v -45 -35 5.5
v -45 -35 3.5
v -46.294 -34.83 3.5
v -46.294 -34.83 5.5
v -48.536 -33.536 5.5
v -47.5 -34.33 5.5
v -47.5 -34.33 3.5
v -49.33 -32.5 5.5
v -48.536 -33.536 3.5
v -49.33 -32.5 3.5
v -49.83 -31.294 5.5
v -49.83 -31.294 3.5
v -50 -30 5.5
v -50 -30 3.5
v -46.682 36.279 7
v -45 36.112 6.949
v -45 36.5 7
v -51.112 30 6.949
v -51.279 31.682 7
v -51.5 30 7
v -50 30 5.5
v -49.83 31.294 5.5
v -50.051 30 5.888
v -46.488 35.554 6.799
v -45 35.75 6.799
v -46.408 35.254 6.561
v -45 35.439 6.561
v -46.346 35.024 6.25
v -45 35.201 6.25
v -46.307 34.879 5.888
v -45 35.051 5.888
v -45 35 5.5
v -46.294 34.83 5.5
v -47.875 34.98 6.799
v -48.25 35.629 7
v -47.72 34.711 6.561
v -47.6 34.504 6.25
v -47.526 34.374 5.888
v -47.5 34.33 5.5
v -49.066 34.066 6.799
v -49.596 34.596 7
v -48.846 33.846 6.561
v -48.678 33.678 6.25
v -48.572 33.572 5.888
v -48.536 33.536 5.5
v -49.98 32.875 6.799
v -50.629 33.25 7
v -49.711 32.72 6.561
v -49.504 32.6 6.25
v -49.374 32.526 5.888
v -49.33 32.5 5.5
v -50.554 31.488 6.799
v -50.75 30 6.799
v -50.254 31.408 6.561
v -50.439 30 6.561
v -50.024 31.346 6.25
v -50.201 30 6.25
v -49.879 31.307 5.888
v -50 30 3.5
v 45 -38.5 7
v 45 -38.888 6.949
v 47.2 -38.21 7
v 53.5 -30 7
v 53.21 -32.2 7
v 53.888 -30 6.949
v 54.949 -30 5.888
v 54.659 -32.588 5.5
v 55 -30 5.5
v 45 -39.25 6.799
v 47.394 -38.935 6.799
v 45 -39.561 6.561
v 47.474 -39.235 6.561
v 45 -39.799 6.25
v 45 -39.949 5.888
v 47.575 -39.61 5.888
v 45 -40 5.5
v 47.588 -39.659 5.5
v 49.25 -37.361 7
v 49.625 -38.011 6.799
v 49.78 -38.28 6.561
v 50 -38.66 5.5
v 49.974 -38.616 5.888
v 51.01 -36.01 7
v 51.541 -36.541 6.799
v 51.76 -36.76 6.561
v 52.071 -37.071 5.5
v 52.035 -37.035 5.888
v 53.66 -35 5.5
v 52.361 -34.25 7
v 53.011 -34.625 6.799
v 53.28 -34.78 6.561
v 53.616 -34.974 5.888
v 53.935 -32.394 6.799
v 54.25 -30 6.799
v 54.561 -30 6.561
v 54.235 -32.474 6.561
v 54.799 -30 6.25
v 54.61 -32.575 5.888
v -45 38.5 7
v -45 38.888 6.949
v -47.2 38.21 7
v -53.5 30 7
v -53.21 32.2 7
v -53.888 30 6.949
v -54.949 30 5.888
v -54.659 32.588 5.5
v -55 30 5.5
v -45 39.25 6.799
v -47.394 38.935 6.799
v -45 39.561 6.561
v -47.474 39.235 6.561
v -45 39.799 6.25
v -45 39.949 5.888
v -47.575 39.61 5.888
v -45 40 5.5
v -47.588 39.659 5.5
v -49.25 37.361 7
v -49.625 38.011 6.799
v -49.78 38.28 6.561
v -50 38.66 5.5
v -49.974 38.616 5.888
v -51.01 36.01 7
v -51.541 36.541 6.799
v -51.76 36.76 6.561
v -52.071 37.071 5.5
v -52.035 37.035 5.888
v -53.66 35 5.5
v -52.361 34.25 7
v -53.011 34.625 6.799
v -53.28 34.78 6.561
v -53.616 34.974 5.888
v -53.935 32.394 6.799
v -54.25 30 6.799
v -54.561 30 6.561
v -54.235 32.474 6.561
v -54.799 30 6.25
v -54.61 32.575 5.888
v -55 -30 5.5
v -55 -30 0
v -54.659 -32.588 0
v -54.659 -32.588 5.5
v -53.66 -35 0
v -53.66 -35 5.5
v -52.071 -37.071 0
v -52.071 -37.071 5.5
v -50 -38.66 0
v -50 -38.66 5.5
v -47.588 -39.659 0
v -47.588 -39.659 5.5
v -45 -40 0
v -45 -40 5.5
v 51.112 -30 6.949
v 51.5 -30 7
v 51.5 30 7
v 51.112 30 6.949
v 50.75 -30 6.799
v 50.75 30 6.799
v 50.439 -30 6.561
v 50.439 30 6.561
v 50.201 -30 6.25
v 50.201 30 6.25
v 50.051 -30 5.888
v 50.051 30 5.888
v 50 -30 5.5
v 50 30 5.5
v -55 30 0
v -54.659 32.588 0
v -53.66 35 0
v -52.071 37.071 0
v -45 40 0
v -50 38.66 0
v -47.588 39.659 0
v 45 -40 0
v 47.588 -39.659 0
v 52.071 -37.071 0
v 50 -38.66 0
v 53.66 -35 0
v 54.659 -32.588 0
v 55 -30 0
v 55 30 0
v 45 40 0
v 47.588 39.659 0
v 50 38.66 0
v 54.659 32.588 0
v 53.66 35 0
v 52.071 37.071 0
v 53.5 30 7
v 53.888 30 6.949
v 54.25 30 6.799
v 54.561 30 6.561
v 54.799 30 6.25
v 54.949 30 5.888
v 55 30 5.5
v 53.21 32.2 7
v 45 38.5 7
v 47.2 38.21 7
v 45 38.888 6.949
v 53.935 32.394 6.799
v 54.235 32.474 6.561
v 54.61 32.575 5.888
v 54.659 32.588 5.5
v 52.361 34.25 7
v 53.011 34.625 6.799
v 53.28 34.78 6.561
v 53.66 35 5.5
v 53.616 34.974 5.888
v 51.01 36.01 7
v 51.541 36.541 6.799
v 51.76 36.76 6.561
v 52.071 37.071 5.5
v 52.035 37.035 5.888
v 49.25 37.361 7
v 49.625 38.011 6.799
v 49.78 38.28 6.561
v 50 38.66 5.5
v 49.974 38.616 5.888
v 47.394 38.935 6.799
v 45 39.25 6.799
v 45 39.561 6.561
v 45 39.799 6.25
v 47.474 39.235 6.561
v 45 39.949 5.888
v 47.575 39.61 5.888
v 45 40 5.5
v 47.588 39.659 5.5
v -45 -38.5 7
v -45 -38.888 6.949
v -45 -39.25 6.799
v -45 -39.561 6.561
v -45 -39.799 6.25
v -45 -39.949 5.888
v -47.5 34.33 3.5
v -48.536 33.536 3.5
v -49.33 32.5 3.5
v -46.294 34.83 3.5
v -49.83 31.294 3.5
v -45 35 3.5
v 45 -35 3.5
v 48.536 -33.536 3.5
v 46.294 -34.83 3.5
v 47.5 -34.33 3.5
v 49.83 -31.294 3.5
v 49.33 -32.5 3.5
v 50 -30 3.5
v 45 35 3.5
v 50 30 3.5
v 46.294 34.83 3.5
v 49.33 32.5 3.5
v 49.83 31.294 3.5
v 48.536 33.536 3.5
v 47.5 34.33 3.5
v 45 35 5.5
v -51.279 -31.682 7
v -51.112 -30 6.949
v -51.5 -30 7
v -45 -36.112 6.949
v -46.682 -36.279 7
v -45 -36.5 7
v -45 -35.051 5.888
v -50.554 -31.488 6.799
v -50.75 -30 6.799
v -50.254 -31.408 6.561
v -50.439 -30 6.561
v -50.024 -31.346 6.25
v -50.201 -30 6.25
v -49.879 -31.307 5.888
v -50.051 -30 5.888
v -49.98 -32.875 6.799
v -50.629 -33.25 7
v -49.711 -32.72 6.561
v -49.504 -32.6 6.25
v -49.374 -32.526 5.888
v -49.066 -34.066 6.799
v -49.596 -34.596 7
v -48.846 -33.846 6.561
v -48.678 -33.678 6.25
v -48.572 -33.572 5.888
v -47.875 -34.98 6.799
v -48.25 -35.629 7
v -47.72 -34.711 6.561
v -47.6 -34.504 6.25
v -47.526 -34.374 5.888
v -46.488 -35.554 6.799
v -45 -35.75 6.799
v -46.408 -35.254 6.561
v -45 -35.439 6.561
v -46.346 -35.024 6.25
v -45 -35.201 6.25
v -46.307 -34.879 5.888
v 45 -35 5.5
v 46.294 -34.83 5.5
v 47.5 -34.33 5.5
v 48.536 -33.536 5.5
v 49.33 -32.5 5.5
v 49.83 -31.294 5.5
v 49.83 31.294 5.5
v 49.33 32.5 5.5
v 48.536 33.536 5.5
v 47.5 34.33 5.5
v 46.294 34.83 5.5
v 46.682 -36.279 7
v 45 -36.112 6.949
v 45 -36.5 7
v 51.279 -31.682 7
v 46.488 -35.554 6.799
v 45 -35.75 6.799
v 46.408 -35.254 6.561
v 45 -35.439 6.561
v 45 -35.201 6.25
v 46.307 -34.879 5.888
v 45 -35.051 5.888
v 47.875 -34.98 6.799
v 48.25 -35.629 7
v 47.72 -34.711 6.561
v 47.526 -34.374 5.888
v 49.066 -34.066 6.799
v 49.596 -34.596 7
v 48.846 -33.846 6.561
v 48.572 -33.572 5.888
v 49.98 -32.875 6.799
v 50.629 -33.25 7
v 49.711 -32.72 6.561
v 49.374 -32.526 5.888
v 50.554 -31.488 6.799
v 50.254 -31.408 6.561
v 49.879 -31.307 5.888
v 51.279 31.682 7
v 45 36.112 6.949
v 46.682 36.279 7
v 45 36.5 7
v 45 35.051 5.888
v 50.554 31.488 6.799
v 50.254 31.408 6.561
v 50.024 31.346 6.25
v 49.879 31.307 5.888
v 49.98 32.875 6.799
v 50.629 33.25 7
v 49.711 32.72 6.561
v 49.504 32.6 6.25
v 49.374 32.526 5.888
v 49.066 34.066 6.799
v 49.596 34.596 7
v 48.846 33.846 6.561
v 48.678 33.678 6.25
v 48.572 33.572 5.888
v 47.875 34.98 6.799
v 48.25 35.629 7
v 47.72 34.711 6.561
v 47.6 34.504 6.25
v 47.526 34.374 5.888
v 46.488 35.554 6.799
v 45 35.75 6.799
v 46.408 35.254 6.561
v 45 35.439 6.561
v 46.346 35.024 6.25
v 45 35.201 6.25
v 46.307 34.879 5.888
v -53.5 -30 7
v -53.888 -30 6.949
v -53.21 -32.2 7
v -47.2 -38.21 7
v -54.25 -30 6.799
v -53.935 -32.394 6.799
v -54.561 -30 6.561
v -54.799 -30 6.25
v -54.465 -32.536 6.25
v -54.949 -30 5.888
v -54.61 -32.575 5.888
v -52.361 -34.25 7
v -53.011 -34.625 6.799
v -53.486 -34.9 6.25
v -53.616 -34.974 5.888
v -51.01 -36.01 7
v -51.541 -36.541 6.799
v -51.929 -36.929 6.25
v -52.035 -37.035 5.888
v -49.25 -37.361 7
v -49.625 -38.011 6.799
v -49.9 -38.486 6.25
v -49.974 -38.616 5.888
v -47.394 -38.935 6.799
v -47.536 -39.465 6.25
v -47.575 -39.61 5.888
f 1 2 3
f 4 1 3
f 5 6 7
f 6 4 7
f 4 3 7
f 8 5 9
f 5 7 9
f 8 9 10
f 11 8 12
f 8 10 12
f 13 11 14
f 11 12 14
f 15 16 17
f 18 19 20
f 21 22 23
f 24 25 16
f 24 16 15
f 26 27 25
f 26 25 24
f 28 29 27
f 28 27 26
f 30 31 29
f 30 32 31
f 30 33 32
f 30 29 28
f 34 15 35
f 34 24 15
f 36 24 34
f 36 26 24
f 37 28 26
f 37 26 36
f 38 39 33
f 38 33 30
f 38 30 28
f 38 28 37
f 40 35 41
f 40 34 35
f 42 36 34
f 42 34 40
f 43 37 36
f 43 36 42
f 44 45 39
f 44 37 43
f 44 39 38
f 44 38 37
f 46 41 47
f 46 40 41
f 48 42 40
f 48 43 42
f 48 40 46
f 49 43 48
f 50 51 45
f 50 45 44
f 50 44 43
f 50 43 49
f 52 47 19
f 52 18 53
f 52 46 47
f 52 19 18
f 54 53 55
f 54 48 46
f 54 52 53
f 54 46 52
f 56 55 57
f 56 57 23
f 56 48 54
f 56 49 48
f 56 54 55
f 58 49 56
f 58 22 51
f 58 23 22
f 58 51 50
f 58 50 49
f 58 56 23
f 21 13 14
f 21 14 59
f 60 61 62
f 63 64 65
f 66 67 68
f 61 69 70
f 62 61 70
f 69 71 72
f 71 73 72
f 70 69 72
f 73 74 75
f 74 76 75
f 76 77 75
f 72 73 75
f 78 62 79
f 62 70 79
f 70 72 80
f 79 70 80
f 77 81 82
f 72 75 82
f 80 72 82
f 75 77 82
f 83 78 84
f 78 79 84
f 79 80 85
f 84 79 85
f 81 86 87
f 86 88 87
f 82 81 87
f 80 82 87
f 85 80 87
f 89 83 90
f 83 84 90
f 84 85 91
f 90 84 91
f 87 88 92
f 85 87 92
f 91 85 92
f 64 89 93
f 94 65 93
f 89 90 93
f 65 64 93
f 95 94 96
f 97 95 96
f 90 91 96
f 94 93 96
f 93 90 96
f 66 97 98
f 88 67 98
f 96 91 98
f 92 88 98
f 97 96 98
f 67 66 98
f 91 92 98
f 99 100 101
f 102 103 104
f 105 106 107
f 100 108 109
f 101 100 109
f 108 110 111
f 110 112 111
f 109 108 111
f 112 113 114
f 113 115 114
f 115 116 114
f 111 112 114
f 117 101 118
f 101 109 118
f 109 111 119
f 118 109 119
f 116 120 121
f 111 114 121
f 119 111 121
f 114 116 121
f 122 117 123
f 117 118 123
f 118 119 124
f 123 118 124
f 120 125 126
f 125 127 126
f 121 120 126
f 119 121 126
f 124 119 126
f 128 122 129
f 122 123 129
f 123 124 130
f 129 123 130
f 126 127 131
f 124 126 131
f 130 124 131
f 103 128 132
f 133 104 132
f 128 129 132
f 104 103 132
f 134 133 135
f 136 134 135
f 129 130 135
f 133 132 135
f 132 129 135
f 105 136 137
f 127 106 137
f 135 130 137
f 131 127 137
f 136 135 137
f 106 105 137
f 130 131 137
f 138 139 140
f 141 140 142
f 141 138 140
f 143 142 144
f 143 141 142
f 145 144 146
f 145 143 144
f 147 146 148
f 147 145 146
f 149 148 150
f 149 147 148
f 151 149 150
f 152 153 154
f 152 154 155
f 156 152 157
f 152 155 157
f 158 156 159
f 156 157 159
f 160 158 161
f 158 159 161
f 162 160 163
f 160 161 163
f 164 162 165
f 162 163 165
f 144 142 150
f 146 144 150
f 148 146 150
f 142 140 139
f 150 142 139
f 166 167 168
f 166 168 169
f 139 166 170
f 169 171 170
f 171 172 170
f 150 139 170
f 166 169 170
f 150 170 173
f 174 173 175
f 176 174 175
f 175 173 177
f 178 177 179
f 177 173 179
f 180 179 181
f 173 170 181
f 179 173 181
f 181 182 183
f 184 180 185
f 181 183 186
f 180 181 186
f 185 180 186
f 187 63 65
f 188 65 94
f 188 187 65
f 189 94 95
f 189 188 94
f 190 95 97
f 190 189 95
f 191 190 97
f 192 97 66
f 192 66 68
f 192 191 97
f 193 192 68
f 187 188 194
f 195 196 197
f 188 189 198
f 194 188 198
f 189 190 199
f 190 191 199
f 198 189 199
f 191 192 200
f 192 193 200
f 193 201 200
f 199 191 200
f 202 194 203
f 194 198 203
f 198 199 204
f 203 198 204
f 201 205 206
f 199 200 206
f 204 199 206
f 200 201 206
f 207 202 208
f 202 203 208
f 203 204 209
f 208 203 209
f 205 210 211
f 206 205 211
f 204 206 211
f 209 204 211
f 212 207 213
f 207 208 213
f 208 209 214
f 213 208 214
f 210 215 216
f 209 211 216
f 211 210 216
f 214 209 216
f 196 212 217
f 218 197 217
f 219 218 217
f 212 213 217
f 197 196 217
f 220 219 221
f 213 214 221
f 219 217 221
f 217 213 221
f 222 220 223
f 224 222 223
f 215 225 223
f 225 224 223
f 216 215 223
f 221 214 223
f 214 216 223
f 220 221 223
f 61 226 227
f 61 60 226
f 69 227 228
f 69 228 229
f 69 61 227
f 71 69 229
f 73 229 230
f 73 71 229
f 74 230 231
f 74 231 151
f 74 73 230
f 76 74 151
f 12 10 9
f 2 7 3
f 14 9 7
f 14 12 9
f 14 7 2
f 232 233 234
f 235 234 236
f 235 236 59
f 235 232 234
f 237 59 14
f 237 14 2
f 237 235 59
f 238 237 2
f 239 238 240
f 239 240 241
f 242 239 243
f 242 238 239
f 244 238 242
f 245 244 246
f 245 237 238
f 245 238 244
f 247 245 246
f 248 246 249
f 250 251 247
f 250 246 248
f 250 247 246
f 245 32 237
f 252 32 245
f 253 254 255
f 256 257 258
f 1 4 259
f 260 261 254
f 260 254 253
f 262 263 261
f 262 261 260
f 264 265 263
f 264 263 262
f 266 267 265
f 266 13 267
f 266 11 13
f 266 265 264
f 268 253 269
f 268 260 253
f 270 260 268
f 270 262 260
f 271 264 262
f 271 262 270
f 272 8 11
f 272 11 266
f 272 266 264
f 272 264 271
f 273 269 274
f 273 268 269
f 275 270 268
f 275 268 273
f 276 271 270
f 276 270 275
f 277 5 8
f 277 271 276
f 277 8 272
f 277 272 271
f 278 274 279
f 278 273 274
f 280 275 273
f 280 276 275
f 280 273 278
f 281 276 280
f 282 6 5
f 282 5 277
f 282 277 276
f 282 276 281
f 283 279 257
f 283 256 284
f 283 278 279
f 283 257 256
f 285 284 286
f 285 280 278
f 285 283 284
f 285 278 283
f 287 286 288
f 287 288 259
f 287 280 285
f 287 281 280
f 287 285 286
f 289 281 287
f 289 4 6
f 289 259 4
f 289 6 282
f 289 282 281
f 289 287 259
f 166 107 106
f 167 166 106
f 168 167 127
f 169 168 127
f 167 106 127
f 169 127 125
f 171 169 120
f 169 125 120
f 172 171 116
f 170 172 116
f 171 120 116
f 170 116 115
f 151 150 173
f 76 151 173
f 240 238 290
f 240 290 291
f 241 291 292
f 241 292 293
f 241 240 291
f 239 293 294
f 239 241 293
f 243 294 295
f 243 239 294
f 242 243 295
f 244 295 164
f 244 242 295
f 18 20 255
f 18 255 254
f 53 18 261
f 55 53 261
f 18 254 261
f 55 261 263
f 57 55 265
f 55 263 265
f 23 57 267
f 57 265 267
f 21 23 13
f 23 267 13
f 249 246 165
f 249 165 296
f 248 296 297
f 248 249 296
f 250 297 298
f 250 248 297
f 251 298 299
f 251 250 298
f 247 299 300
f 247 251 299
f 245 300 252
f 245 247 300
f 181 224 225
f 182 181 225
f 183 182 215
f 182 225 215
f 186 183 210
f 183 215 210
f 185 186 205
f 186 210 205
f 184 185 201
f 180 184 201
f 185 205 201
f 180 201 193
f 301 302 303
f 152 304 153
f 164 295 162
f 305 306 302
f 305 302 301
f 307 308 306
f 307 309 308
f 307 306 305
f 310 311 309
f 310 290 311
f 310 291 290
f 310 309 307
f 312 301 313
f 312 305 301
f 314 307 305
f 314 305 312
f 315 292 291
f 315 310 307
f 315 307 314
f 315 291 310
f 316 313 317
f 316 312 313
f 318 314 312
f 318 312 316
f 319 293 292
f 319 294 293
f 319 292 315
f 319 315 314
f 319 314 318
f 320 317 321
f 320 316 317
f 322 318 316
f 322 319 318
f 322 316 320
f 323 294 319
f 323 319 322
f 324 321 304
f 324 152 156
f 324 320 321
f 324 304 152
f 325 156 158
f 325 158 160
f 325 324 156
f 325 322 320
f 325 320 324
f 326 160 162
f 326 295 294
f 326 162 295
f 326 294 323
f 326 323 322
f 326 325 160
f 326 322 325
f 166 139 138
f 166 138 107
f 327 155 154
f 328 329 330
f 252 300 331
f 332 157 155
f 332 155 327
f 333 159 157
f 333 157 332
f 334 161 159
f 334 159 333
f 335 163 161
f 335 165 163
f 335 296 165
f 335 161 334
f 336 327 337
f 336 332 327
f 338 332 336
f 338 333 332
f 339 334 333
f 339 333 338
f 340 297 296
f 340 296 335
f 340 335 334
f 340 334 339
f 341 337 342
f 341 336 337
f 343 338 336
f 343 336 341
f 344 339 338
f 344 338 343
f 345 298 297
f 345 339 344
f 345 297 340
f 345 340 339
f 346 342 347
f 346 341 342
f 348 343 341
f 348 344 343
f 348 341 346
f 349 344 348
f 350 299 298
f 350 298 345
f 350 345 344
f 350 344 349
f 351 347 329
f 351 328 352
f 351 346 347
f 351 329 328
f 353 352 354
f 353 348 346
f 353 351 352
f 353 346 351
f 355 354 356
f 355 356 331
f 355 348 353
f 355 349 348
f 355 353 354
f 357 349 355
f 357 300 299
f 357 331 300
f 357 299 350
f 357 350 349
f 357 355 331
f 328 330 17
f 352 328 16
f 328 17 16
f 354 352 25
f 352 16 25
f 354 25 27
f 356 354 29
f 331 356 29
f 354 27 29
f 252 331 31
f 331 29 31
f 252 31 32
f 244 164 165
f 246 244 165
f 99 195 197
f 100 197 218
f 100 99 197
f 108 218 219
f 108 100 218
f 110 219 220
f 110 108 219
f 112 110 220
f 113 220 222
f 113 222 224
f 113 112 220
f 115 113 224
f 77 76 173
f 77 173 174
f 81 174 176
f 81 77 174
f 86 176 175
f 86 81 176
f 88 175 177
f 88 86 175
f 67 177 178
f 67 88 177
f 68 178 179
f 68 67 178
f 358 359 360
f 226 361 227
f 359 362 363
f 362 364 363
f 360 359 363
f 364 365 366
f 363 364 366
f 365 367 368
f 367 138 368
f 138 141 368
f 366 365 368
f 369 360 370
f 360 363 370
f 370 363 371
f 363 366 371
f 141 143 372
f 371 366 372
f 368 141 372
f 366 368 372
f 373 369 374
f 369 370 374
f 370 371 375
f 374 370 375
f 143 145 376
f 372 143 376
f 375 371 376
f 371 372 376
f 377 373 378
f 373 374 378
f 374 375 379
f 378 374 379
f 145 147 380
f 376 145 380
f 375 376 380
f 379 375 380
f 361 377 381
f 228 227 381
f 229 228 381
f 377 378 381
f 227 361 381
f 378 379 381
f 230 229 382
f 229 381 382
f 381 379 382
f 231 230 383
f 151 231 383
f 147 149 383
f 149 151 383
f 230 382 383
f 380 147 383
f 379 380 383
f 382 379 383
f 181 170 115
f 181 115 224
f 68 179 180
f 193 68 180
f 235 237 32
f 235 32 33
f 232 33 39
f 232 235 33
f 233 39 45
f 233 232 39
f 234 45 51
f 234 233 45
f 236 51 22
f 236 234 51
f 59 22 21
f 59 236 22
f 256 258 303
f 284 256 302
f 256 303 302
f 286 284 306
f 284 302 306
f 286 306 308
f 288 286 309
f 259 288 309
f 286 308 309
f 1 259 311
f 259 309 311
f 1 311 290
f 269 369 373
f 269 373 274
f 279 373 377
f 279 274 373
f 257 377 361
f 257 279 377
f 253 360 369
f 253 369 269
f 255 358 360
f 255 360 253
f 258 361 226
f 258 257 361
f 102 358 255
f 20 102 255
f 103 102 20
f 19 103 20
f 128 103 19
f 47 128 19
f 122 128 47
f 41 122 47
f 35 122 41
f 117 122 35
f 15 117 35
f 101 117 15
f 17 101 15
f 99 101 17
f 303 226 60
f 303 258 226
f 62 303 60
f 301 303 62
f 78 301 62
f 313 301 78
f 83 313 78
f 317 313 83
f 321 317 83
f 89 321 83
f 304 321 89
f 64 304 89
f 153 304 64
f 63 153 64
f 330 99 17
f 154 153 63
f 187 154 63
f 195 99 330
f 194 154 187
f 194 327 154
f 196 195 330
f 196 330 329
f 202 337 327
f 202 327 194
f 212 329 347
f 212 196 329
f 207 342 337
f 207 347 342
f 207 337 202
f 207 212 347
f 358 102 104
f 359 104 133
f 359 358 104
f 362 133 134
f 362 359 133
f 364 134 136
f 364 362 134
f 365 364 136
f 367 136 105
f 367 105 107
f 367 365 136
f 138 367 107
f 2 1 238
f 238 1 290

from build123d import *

# Parameters (mm, degrees)
F0_W     = 110
F0_H     = 80
F1_DEPTH = 7
F2_W     = 100.000002
F2_H     = 70.000002
F3_DEPTH = 3.5
F4_R     = 5
F5_R     = 10
F6_R     = 1.5


with BuildPart() as f1:
    # F0 (on Top) → F1 (new body)
    with BuildSketch(Plane.XY):
        Rectangle(F0_W, F0_H)
    extrude(amount=F1_DEPTH)

    # F2 (on face) → F3 (cut)
    with BuildSketch(Plane.XY.offset(7)):
        Rectangle(F2_W, F2_H)
    extrude(amount=-F3_DEPTH, mode=Mode.SUBTRACT)

    # F4
    f4_edges = [f1.edges().sort_by_distance(p)[0] for p in [
        (50.000001, -35.000001, 5.25),
        (-50.000001, -35.000001, 5.25),
        (-50.000001, 35.000001, 5.25),
        (50.000001, 35.000001, 5.25),
    ]]
    fillet(f4_edges, radius=F4_R)

    # F5
    f5_edges = [f1.edges().sort_by_distance(p)[0] for p in [
        (-55, -40, 3.5),
        (55, -40, 3.5),
        (55, 40, 3.5),
        (-55, 40, 3.5),
    ]]
    fillet(f5_edges, radius=F5_R)

    # F6
    f6_edges = [f1.edges().sort_by_distance(p)[0] for p in [
        (0, -40, 7),
        (50.000001, 0, 7),
    ]]
    fillet(f6_edges, radius=F6_R)


solid = f1.part
